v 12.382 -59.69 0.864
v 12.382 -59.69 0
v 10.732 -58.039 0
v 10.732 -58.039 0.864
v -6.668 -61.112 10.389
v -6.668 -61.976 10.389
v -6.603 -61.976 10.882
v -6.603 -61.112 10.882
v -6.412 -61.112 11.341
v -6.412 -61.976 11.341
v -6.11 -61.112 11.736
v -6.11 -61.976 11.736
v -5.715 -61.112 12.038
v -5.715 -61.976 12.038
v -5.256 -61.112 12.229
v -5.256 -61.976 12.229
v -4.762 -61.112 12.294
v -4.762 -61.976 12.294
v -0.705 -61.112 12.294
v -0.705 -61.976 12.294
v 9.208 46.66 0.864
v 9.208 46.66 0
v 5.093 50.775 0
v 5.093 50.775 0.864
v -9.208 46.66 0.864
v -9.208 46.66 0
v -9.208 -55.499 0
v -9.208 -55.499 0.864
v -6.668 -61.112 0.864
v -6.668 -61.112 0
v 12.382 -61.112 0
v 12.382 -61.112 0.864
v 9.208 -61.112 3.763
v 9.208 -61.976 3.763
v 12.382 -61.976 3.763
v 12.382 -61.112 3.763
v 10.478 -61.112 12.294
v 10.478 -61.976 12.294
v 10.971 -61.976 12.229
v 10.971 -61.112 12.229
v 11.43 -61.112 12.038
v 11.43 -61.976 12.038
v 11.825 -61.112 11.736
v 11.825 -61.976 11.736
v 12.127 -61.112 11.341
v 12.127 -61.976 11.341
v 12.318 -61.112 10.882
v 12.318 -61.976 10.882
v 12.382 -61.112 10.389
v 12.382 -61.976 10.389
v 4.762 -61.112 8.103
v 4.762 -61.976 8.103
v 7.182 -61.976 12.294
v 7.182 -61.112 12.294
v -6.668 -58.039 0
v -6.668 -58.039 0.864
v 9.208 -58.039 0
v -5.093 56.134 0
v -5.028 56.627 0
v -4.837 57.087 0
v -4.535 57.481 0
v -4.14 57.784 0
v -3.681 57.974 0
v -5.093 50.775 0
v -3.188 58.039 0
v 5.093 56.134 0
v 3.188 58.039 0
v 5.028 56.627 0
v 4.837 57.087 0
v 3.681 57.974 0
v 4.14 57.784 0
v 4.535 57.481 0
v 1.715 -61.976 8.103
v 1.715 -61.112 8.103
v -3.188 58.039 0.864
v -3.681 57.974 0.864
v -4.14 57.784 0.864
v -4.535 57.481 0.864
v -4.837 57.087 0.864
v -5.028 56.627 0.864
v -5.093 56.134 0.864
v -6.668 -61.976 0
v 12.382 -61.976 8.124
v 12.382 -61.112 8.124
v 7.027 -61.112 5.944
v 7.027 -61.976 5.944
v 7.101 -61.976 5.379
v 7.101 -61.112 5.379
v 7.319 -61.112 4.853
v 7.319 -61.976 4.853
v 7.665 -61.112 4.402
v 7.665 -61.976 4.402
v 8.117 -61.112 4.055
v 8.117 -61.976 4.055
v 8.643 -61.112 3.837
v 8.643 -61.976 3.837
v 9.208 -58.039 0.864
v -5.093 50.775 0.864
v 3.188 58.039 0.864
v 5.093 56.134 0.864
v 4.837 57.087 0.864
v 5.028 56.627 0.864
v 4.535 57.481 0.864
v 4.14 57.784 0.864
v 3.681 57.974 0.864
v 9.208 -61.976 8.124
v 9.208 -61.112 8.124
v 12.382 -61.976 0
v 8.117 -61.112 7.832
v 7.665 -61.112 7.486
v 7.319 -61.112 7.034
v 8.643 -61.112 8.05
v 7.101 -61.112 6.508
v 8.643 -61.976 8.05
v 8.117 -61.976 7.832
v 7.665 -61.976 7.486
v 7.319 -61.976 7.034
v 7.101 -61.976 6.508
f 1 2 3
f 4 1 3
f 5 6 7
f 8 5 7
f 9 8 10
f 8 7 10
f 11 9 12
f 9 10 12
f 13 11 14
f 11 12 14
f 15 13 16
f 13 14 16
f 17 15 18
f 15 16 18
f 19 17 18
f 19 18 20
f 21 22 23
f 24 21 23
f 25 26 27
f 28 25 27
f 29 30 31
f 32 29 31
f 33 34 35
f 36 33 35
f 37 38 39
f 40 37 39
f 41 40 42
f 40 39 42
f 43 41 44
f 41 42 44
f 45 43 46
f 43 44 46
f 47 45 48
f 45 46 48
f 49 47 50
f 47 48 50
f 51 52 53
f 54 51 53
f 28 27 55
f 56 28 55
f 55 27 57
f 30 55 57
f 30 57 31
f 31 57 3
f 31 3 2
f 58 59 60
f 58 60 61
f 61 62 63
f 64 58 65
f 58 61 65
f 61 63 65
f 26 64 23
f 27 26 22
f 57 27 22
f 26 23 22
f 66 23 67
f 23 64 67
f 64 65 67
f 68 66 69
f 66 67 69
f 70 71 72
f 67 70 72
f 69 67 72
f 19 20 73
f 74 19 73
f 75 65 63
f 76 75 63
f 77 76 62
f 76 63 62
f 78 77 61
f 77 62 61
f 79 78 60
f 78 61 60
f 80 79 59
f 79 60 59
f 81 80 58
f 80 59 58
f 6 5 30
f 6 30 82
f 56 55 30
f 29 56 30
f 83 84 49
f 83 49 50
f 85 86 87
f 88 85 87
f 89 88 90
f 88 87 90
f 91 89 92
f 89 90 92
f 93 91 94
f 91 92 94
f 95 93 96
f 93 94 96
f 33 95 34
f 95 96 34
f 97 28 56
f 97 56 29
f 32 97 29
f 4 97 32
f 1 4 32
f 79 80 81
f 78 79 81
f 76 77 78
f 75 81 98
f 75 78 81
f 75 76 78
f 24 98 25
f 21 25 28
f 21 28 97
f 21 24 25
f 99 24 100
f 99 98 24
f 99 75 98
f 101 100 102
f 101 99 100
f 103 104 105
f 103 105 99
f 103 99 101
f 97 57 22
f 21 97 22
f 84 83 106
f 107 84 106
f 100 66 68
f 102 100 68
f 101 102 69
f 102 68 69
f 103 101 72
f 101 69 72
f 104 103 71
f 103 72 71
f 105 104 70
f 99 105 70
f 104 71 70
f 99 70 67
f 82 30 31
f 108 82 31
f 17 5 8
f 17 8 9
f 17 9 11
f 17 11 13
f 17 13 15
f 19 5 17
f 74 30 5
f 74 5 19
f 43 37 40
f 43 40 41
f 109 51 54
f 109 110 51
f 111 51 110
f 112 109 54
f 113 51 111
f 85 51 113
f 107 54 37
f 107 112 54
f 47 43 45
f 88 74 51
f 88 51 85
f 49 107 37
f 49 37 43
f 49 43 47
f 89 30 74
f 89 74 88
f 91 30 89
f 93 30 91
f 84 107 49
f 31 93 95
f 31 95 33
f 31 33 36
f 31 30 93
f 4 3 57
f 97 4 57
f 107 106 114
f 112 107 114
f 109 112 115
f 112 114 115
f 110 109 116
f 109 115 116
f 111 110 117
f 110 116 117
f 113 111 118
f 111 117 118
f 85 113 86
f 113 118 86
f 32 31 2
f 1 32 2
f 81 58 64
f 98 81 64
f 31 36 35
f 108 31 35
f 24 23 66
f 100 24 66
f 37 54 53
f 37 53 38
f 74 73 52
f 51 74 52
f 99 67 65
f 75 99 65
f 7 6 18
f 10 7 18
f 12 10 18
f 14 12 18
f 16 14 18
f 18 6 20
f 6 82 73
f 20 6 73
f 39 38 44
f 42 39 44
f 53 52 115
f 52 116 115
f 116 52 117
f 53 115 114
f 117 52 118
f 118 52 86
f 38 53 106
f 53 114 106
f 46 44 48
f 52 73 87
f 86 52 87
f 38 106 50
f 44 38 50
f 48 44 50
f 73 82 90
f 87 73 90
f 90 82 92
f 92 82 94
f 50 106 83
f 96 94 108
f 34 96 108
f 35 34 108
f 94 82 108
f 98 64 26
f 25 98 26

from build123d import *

# Parameters (mm, degrees)
F1_DEPTH = 0.8636
F2_DEPTH = 0.8636
F3_DEPTH = 11.43
F4_W     = 3.048
F4_H     = 4.191
F5_DEPTH = 0.8636


# Not quite as in the source:
# - a feature names something its author has since deleted; it is built from what else it names


with BuildPart() as f1:
    # F0 (on Top) → F1 (new body)
    with BuildSketch(Plane.XY):
        Polygon((10.7315, -58.039), (9.2075, -58.039), (-6.6675, -58.039), (-6.6675, -61.1124), (12.3825, -61.1124), (12.3825, -59.69), align=None)
        with BuildLine():
            ThreePointArc((5.0927, 56.134), (4.5347384182, 57.4810384182), (3.1877, 58.039))
            Line((3.1877, 58.039), (0, 58.039))
            Line((0, 58.039), (-3.1877, 58.039))
            ThreePointArc((-3.1877, 58.039), (-4.5347384182, 57.4810384182), (-5.0927, 56.134))
            Line((-5.0927, 56.134), (-5.0927, 50.7746))
            Line((-5.0927, 50.7746), (-9.2075, 46.6598))
            Line((-9.2075, 46.6598), (-9.2075, -55.499))
            Line((-9.2075, -55.499), (-6.6675, -58.039))
            Line((-6.6675, -58.039), (9.2075, -58.039))
            Line((9.2075, -58.039), (9.2075, 46.6598))
            Line((9.2075, 46.6598), (5.0927, 50.7746))
            Line((5.0927, 50.7746), (5.0927, 56.134))
        make_face()
    extrude(amount=F1_DEPTH)


with BuildPart() as f2:
    # F2 (new): a face of the model
    f2_faces = [f1.part.faces().sort_by_distance(p)[0] for p in [
        (2.8575, -61.1124, 0.4318),
    ]]
    extrude(f2_faces, amount=F2_DEPTH)

    # F3 (add): a face of the model
    f3_faces = [f2.faces().sort_by_distance(p)[0] for p in [
        (2.8575, -61.5442, 0.8636),
    ]]
    extrude(f3_faces, amount=F3_DEPTH)

    # F4 (on face) → F5 (cut)
    with BuildSketch(Plane.XZ.offset(61.976)):
        with BuildLine():
            Line((12.3825, 3.7627826078), (12.3825, 8.1244173922))
            Line((12.3825, 8.1244173922), (9.2075, 8.1244173922))
            ThreePointArc((9.2075, 8.1244173922), (7.6654292335, 7.4856707665), (7.0266826078, 5.9436))
            ThreePointArc((7.0266826078, 5.9436), (7.6654292335, 4.4015292335), (9.2075, 3.7627826078))
            Line((9.2075, 3.7627826078), (12.3825, 3.7627826078))
        make_face()
        Polygon((1.7145, 8.1026), (1.7145, 12.2936), (-0.7051749782, 12.2936), align=None)
        with Locations((3.2385, 10.1981)):
            Rectangle(F4_W, F4_H)
        Polygon((7.1821749782, 12.2936), (4.7625, 12.2936), (4.7625, 8.1026), align=None)
        with BuildLine():
            Line((12.3825, 12.2936), (10.4775, 12.2936))
            ThreePointArc((10.4775, 12.2936), (11.8245384182, 11.7356384182), (12.3825, 10.3886))
            Line((12.3825, 10.3886), (12.3825, 12.2936))
        make_face()
        with BuildLine():
            ThreePointArc((-6.6675, 10.3886), (-6.1095384182, 11.7356384182), (-4.7625, 12.2936))
            Line((-4.7625, 12.2936), (-6.6675, 12.2936))
            Line((-6.6675, 12.2936), (-6.6675, 10.3886))
        make_face()
    extrude(amount=-F5_DEPTH, mode=Mode.SUBTRACT)


solid = Compound([f1.part, f2.part])
